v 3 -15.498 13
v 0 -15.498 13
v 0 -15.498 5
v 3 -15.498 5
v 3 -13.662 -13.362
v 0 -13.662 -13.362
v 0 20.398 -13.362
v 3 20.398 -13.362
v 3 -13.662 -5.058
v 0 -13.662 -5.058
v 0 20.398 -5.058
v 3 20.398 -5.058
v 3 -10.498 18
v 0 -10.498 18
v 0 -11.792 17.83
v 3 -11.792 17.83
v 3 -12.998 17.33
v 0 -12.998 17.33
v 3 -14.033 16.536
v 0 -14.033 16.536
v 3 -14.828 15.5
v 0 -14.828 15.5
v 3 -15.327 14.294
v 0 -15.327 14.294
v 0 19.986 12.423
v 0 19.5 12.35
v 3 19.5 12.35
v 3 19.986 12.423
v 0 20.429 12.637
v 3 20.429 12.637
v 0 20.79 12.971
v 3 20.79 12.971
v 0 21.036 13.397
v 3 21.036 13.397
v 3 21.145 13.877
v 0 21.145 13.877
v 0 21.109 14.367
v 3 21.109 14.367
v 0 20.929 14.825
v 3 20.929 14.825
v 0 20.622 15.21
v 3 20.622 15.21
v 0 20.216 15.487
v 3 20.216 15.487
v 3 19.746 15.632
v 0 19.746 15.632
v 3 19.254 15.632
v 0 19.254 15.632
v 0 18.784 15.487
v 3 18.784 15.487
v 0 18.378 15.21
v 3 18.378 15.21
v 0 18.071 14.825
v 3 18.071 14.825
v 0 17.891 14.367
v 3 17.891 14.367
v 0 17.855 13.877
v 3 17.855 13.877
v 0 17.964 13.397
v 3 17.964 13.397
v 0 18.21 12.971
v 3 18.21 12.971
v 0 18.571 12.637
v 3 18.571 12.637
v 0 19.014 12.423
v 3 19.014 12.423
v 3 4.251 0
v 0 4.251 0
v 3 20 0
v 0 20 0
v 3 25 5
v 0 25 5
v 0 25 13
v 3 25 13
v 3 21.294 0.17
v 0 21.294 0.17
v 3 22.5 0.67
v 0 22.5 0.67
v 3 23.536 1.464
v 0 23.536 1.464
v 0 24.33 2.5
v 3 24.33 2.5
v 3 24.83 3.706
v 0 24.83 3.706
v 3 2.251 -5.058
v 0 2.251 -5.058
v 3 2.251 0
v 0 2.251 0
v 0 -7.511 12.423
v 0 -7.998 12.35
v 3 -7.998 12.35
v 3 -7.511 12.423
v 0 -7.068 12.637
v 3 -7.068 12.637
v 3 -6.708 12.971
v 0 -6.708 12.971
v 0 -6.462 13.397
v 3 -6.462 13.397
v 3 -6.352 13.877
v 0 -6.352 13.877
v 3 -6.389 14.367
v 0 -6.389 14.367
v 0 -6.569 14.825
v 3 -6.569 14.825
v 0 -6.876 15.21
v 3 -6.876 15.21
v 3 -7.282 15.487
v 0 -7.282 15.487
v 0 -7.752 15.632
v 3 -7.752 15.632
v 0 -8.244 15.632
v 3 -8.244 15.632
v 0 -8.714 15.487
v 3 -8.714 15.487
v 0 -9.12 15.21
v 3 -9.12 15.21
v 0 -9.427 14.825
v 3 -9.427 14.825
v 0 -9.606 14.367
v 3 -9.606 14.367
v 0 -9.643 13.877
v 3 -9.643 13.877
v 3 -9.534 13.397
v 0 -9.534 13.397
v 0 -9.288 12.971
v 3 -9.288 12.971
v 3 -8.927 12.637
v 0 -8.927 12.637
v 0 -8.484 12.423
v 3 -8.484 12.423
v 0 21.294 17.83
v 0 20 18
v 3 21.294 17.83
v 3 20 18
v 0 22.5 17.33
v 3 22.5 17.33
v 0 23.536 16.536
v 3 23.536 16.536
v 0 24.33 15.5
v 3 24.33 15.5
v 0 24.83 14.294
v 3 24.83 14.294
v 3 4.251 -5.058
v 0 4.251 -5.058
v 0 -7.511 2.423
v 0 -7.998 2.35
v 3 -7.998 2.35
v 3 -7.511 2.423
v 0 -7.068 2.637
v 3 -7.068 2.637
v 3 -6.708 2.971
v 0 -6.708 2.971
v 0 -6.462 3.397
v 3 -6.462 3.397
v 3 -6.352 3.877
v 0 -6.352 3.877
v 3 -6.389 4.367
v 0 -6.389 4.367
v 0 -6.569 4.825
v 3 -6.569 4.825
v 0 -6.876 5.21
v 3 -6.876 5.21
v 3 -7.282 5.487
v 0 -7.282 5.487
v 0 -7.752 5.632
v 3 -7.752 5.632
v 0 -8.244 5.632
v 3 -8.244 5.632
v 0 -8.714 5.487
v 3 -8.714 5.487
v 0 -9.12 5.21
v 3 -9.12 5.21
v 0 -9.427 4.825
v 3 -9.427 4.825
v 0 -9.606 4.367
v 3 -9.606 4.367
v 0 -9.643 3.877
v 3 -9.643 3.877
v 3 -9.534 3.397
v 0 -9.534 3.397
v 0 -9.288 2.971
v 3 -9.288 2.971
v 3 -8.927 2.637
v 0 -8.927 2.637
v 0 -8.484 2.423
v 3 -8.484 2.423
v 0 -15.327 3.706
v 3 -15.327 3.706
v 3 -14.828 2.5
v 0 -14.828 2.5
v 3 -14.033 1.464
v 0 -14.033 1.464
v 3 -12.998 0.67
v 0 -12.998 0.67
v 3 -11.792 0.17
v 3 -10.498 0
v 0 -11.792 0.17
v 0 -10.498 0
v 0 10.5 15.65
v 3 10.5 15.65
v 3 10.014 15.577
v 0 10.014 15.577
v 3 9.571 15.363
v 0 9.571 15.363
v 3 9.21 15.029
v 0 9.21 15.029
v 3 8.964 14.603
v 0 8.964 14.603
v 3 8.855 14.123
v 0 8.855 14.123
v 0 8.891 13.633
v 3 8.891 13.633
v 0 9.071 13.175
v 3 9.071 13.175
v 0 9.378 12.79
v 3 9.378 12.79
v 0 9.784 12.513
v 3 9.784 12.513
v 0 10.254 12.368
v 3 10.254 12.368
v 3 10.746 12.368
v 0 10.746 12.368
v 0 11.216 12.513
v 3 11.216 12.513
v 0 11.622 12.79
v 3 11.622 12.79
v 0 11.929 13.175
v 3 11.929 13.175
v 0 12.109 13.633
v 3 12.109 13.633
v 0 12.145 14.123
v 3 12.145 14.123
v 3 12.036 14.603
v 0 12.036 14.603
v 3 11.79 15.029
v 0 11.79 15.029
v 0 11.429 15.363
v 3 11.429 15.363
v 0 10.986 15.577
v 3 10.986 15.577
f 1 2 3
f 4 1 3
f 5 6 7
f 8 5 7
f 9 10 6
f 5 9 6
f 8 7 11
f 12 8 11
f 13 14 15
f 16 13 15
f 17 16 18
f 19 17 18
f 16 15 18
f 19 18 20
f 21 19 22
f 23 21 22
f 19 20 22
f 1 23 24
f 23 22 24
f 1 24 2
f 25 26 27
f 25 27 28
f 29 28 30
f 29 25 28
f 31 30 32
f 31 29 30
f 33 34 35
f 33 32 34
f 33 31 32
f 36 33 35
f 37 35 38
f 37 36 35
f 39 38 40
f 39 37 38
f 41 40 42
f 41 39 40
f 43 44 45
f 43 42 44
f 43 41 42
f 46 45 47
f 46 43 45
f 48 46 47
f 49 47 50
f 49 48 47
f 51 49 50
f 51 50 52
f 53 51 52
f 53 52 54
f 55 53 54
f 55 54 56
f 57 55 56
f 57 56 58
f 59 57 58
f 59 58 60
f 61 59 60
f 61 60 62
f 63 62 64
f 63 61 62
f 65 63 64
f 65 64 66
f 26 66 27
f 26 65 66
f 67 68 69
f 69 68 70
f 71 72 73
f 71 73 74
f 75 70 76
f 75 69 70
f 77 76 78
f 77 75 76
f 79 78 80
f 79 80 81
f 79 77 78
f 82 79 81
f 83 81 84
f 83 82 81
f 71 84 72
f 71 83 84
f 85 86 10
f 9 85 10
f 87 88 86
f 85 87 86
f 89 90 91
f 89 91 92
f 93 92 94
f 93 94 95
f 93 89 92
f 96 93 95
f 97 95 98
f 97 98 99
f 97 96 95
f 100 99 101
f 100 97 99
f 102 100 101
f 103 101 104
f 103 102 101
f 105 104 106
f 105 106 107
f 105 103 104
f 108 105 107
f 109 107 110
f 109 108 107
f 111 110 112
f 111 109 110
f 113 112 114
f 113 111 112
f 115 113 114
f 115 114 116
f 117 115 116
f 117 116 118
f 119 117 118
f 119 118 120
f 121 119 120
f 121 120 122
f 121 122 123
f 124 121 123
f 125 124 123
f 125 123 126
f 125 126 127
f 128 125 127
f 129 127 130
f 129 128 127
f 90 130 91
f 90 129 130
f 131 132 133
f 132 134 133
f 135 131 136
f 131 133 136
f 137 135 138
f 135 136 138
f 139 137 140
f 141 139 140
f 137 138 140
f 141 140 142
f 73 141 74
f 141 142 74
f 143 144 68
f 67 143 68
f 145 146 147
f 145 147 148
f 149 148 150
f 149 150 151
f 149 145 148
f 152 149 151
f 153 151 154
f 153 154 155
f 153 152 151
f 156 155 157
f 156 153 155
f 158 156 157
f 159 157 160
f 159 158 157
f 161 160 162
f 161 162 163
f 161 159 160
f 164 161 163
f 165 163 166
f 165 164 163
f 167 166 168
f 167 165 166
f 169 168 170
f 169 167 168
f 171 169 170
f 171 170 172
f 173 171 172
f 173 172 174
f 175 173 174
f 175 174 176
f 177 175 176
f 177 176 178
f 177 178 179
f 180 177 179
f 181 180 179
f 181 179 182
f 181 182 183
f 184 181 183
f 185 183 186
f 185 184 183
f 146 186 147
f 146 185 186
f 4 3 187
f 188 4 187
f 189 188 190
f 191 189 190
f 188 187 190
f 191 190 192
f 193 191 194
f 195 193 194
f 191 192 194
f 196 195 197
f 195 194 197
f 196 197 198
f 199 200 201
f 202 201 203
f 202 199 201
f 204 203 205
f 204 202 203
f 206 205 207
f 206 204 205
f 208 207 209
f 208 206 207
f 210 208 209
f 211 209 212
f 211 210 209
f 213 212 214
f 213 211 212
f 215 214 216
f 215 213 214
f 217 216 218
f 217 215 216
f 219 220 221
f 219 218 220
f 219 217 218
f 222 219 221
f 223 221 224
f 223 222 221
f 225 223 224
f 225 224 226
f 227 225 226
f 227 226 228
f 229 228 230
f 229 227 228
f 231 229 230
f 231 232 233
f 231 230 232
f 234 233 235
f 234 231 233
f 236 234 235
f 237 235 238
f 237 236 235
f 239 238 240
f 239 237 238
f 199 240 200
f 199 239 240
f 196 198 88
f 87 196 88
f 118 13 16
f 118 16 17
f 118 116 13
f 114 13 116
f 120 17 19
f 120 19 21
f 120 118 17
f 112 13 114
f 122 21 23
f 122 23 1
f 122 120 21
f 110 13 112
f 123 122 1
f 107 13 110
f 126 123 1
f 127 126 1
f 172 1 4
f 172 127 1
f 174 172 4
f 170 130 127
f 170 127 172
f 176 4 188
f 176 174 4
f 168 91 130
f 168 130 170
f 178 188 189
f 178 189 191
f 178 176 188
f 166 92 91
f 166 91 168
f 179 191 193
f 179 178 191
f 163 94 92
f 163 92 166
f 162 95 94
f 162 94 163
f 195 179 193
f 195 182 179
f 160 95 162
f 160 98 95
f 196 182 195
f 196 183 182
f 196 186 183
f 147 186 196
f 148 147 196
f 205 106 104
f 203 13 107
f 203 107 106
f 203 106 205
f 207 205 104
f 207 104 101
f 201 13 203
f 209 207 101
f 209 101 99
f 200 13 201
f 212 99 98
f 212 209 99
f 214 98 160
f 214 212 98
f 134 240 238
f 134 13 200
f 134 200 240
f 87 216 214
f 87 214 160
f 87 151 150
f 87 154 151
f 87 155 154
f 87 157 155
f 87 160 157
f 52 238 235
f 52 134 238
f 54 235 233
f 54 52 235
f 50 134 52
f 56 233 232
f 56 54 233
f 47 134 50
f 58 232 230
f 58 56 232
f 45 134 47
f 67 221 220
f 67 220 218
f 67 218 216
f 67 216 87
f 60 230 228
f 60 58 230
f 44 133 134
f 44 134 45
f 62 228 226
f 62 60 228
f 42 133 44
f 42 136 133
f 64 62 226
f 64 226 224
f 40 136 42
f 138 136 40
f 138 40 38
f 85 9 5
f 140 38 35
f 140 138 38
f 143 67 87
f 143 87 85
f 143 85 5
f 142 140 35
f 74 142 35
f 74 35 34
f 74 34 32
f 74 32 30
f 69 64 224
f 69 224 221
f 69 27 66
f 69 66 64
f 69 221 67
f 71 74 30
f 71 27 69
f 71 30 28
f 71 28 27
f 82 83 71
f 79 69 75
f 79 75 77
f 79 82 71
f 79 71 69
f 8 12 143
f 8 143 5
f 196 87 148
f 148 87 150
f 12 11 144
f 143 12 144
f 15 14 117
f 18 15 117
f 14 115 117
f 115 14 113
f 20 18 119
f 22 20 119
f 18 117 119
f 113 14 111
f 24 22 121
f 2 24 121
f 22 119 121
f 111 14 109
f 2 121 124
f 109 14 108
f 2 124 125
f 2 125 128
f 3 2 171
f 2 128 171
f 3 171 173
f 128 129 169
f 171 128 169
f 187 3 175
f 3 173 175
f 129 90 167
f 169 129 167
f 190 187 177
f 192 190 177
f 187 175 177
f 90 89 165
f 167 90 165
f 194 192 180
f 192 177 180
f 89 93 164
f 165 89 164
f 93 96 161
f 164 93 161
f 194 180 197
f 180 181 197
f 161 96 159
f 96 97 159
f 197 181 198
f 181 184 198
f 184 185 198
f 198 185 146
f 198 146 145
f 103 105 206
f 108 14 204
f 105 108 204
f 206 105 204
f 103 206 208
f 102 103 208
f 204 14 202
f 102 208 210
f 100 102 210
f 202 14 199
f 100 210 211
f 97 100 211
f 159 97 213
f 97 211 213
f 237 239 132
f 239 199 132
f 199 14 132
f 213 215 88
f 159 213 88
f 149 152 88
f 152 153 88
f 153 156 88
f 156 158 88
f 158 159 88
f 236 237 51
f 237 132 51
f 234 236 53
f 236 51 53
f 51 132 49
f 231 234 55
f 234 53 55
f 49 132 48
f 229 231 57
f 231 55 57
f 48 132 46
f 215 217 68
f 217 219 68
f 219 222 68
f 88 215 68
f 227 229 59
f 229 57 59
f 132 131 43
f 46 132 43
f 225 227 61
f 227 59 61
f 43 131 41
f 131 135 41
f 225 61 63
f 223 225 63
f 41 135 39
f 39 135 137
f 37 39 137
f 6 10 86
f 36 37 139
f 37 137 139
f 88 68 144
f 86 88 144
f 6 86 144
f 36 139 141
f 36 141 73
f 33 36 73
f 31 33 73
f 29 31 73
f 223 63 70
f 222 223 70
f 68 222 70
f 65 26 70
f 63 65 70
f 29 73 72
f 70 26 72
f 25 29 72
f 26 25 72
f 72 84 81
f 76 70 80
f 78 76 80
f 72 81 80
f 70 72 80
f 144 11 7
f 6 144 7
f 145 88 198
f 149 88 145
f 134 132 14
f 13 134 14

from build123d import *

# Parameters (mm, degrees)
T_LE_DE_BASE_PLI_E1_DEPTH    = 18
ENL_V_MAT_EXTRU_1_DEPTH      = 36.185224172
ENL_V_MAT_EXTRU_1_DEPTH_BACK = 36.185224172
ESQUISSE6_R                  = 1.65
ENL_V_MAT_EXTRU_2_DEPTH      = 35.756294394
ENL_V_MAT_EXTRU_2_DEPTH_BACK = 35.756294394
ESQUISSE7_R                  = 1.65
CONG_1_R                     = 5
BOSS_EXTRU_1_OUTLINE_R       = 1.65
BOSS_EXTRU_1_DEPTH           = 17
BOSS_EXTRU_1_START           = -3
BOSS_EXTRU_1_2_OUTLINE_R     = 1.65
BOSS_EXTRU_1_2_DEPTH         = 3


with BuildPart() as part:
    # Tôle de base pliée1: sheet metal written as solids
    # Esquisse1 → Tôle de base pliée1 (new body)
    with BuildSketch(Plane.XY):
        with BuildLine():
            Line((20, 0), (5, 0))
            ThreePointArc((5, 0), (1.464466094, 1.464466094), (0, 5))
            Line((0, 5), (0, 25))
            Line((0, 25), (3, 25))
            Line((3, 25), (3, 5))
            ThreePointArc((3, 5), (3.585786438, 3.585786438), (5, 3))
            Line((5, 3), (20, 3))
            Line((20, 3), (20, 0))
        make_face()
    extrude(amount=T_LE_DE_BASE_PLI_E1_DEPTH)

    # Esquisse6 → Enlèv. mat.-Extru.1 (cut, two sides: drawn at the far end of the back side and taken through both)
    with BuildSketch(Plane(origin=(3, 0, 0), x_dir=(0, 0, -1), z_dir=(1, 0, 0)).offset(-ENL_V_MAT_EXTRU_1_DEPTH_BACK)):
        with Locations((-14, 19.5)):
            Circle(ESQUISSE6_R)
        with Locations(Location((-14, 10.5, 0), (0, 0, 180))):
            Circle(ESQUISSE6_R)
    extrude(amount=ENL_V_MAT_EXTRU_1_DEPTH + ENL_V_MAT_EXTRU_1_DEPTH_BACK, mode=Mode.SUBTRACT)

    # Esquisse7 → Enlèv. mat.-Extru.2 (cut, two sides: drawn at the far end of the back side and taken through both)
    with BuildSketch(Plane(origin=(0, 3, 0), x_dir=(1, 0, 0), z_dir=(0, 1, 0)).offset(-ENL_V_MAT_EXTRU_2_DEPTH_BACK)):
        with Locations(Location((12.5, -4, 0), (0, 0, 270))):
            Circle(ESQUISSE7_R)
        with Locations(Location((12.5, -14, 0), (0, 0, 90))):
            Circle(ESQUISSE7_R)
    extrude(amount=ENL_V_MAT_EXTRU_2_DEPTH + ENL_V_MAT_EXTRU_2_DEPTH_BACK, mode=Mode.SUBTRACT)

    # Congé1
    cong_1_edges = [part.edges().sort_by_distance(p)[0] for p in [
        (20, 1.5, 18),
        (1.5, 25, 18),
        (20, 1.5, 0),
        (1.5, 25, 0),
    ]]
    fillet(cong_1_edges, radius=CONG_1_R)

    # Boss.-Extru.1: read off the stored shape, not the designer's step
    # Boss.-Extru.1 outline → Boss.-Extru.1 (cut)
    with BuildSketch(Plane(origin=(3, 0, 0), x_dir=(0, 0, -1), z_dir=(1, 0, 0))):
        with BuildLine():
            Line((-13, -15.497787144), (-5, -15.497787144))
            ThreePointArc((-5, -15.497787144), (-1.464466094, -14.03332105), (0, -10.497787144))
            Line((0, -10.497787144), (0, 2.251106428))
            Line((0, 2.251106428), (5.057824139, 2.251106428))
            Line((5.057824139, 2.251106428), (5.057824139, -13.661822952))
            Line((5.057824139, -13.661822952), (13.362072183, -13.661822952))
            Line((13.362072183, -13.661822952), (13.362072183, 20.398028744))
            Line((13.362072183, 20.398028744), (5.057824139, 20.398028744))
            Line((5.057824139, 20.398028744), (5.057824139, 4.251106428))
            Line((5.057824139, 4.251106428), (0, 4.251106428))
            Line((0, 4.251106428), (0, 20))
            ThreePointArc((0, 20), (-1.464466094, 23.535533906), (-5, 25))
            Line((-5, 25), (-13, 25))
            ThreePointArc((-13, 25), (-16.535533906, 23.535533906), (-18, 20))
            Line((-18, 20), (-18, -10.497787144))
            ThreePointArc((-18, -10.497787144), (-16.535533906, -14.03332105), (-13, -15.497787144))
        make_face()
        with Locations((-14, -7.997787144)):
            Circle(BOSS_EXTRU_1_OUTLINE_R, mode=Mode.SUBTRACT)
        with Locations((-4, -7.997787144)):
            Circle(BOSS_EXTRU_1_OUTLINE_R, mode=Mode.SUBTRACT)
        with Locations((-14, 10.5)):
            Circle(BOSS_EXTRU_1_OUTLINE_R, mode=Mode.SUBTRACT)
        with Locations((-14, 19.5)):
            Circle(BOSS_EXTRU_1_OUTLINE_R, mode=Mode.SUBTRACT)
    extrude(amount=BOSS_EXTRU_1_DEPTH, mode=Mode.SUBTRACT)

    # Boss.-Extru.1 2 outline → Boss.-Extru.1 2 (add)
    with BuildSketch(Plane(origin=(3, 0, 0), x_dir=(0, 0, -1), z_dir=(1, 0, 0)).offset(BOSS_EXTRU_1_START)):
        with BuildLine():
            Line((-13, -15.497787144), (-5, -15.497787144))
            ThreePointArc((-5, -15.497787144), (-1.464466094, -14.03332105), (0, -10.497787144))
            Line((0, -10.497787144), (0, 2.251106428))
            Line((0, 2.251106428), (5.057824139, 2.251106428))
            Line((5.057824139, 2.251106428), (5.057824139, -13.661822952))
            Line((5.057824139, -13.661822952), (13.362072183, -13.661822952))
            Line((13.362072183, -13.661822952), (13.362072183, 20.398028744))
            Line((13.362072183, 20.398028744), (5.057824139, 20.398028744))
            Line((5.057824139, 20.398028744), (5.057824139, 4.251106428))
            Line((5.057824139, 4.251106428), (0, 4.251106428))
            Line((0, 4.251106428), (0, 20))
            ThreePointArc((0, 20), (-1.464466094, 23.535533906), (-5, 25))
            Line((-5, 25), (-13, 25))
            ThreePointArc((-13, 25), (-16.535533906, 23.535533906), (-18, 20))
            Line((-18, 20), (-18, -10.497787144))
            ThreePointArc((-18, -10.497787144), (-16.535533906, -14.03332105), (-13, -15.497787144))
        make_face()
        with Locations((-14, -7.997787144)):
            Circle(BOSS_EXTRU_1_2_OUTLINE_R, mode=Mode.SUBTRACT)
        with Locations((-4, -7.997787144)):
            Circle(BOSS_EXTRU_1_2_OUTLINE_R, mode=Mode.SUBTRACT)
        with Locations((-14, 10.5)):
            Circle(BOSS_EXTRU_1_2_OUTLINE_R, mode=Mode.SUBTRACT)
        with Locations((-14, 19.5)):
            Circle(BOSS_EXTRU_1_2_OUTLINE_R, mode=Mode.SUBTRACT)
    extrude(amount=BOSS_EXTRU_1_2_DEPTH)


solid = part.part
